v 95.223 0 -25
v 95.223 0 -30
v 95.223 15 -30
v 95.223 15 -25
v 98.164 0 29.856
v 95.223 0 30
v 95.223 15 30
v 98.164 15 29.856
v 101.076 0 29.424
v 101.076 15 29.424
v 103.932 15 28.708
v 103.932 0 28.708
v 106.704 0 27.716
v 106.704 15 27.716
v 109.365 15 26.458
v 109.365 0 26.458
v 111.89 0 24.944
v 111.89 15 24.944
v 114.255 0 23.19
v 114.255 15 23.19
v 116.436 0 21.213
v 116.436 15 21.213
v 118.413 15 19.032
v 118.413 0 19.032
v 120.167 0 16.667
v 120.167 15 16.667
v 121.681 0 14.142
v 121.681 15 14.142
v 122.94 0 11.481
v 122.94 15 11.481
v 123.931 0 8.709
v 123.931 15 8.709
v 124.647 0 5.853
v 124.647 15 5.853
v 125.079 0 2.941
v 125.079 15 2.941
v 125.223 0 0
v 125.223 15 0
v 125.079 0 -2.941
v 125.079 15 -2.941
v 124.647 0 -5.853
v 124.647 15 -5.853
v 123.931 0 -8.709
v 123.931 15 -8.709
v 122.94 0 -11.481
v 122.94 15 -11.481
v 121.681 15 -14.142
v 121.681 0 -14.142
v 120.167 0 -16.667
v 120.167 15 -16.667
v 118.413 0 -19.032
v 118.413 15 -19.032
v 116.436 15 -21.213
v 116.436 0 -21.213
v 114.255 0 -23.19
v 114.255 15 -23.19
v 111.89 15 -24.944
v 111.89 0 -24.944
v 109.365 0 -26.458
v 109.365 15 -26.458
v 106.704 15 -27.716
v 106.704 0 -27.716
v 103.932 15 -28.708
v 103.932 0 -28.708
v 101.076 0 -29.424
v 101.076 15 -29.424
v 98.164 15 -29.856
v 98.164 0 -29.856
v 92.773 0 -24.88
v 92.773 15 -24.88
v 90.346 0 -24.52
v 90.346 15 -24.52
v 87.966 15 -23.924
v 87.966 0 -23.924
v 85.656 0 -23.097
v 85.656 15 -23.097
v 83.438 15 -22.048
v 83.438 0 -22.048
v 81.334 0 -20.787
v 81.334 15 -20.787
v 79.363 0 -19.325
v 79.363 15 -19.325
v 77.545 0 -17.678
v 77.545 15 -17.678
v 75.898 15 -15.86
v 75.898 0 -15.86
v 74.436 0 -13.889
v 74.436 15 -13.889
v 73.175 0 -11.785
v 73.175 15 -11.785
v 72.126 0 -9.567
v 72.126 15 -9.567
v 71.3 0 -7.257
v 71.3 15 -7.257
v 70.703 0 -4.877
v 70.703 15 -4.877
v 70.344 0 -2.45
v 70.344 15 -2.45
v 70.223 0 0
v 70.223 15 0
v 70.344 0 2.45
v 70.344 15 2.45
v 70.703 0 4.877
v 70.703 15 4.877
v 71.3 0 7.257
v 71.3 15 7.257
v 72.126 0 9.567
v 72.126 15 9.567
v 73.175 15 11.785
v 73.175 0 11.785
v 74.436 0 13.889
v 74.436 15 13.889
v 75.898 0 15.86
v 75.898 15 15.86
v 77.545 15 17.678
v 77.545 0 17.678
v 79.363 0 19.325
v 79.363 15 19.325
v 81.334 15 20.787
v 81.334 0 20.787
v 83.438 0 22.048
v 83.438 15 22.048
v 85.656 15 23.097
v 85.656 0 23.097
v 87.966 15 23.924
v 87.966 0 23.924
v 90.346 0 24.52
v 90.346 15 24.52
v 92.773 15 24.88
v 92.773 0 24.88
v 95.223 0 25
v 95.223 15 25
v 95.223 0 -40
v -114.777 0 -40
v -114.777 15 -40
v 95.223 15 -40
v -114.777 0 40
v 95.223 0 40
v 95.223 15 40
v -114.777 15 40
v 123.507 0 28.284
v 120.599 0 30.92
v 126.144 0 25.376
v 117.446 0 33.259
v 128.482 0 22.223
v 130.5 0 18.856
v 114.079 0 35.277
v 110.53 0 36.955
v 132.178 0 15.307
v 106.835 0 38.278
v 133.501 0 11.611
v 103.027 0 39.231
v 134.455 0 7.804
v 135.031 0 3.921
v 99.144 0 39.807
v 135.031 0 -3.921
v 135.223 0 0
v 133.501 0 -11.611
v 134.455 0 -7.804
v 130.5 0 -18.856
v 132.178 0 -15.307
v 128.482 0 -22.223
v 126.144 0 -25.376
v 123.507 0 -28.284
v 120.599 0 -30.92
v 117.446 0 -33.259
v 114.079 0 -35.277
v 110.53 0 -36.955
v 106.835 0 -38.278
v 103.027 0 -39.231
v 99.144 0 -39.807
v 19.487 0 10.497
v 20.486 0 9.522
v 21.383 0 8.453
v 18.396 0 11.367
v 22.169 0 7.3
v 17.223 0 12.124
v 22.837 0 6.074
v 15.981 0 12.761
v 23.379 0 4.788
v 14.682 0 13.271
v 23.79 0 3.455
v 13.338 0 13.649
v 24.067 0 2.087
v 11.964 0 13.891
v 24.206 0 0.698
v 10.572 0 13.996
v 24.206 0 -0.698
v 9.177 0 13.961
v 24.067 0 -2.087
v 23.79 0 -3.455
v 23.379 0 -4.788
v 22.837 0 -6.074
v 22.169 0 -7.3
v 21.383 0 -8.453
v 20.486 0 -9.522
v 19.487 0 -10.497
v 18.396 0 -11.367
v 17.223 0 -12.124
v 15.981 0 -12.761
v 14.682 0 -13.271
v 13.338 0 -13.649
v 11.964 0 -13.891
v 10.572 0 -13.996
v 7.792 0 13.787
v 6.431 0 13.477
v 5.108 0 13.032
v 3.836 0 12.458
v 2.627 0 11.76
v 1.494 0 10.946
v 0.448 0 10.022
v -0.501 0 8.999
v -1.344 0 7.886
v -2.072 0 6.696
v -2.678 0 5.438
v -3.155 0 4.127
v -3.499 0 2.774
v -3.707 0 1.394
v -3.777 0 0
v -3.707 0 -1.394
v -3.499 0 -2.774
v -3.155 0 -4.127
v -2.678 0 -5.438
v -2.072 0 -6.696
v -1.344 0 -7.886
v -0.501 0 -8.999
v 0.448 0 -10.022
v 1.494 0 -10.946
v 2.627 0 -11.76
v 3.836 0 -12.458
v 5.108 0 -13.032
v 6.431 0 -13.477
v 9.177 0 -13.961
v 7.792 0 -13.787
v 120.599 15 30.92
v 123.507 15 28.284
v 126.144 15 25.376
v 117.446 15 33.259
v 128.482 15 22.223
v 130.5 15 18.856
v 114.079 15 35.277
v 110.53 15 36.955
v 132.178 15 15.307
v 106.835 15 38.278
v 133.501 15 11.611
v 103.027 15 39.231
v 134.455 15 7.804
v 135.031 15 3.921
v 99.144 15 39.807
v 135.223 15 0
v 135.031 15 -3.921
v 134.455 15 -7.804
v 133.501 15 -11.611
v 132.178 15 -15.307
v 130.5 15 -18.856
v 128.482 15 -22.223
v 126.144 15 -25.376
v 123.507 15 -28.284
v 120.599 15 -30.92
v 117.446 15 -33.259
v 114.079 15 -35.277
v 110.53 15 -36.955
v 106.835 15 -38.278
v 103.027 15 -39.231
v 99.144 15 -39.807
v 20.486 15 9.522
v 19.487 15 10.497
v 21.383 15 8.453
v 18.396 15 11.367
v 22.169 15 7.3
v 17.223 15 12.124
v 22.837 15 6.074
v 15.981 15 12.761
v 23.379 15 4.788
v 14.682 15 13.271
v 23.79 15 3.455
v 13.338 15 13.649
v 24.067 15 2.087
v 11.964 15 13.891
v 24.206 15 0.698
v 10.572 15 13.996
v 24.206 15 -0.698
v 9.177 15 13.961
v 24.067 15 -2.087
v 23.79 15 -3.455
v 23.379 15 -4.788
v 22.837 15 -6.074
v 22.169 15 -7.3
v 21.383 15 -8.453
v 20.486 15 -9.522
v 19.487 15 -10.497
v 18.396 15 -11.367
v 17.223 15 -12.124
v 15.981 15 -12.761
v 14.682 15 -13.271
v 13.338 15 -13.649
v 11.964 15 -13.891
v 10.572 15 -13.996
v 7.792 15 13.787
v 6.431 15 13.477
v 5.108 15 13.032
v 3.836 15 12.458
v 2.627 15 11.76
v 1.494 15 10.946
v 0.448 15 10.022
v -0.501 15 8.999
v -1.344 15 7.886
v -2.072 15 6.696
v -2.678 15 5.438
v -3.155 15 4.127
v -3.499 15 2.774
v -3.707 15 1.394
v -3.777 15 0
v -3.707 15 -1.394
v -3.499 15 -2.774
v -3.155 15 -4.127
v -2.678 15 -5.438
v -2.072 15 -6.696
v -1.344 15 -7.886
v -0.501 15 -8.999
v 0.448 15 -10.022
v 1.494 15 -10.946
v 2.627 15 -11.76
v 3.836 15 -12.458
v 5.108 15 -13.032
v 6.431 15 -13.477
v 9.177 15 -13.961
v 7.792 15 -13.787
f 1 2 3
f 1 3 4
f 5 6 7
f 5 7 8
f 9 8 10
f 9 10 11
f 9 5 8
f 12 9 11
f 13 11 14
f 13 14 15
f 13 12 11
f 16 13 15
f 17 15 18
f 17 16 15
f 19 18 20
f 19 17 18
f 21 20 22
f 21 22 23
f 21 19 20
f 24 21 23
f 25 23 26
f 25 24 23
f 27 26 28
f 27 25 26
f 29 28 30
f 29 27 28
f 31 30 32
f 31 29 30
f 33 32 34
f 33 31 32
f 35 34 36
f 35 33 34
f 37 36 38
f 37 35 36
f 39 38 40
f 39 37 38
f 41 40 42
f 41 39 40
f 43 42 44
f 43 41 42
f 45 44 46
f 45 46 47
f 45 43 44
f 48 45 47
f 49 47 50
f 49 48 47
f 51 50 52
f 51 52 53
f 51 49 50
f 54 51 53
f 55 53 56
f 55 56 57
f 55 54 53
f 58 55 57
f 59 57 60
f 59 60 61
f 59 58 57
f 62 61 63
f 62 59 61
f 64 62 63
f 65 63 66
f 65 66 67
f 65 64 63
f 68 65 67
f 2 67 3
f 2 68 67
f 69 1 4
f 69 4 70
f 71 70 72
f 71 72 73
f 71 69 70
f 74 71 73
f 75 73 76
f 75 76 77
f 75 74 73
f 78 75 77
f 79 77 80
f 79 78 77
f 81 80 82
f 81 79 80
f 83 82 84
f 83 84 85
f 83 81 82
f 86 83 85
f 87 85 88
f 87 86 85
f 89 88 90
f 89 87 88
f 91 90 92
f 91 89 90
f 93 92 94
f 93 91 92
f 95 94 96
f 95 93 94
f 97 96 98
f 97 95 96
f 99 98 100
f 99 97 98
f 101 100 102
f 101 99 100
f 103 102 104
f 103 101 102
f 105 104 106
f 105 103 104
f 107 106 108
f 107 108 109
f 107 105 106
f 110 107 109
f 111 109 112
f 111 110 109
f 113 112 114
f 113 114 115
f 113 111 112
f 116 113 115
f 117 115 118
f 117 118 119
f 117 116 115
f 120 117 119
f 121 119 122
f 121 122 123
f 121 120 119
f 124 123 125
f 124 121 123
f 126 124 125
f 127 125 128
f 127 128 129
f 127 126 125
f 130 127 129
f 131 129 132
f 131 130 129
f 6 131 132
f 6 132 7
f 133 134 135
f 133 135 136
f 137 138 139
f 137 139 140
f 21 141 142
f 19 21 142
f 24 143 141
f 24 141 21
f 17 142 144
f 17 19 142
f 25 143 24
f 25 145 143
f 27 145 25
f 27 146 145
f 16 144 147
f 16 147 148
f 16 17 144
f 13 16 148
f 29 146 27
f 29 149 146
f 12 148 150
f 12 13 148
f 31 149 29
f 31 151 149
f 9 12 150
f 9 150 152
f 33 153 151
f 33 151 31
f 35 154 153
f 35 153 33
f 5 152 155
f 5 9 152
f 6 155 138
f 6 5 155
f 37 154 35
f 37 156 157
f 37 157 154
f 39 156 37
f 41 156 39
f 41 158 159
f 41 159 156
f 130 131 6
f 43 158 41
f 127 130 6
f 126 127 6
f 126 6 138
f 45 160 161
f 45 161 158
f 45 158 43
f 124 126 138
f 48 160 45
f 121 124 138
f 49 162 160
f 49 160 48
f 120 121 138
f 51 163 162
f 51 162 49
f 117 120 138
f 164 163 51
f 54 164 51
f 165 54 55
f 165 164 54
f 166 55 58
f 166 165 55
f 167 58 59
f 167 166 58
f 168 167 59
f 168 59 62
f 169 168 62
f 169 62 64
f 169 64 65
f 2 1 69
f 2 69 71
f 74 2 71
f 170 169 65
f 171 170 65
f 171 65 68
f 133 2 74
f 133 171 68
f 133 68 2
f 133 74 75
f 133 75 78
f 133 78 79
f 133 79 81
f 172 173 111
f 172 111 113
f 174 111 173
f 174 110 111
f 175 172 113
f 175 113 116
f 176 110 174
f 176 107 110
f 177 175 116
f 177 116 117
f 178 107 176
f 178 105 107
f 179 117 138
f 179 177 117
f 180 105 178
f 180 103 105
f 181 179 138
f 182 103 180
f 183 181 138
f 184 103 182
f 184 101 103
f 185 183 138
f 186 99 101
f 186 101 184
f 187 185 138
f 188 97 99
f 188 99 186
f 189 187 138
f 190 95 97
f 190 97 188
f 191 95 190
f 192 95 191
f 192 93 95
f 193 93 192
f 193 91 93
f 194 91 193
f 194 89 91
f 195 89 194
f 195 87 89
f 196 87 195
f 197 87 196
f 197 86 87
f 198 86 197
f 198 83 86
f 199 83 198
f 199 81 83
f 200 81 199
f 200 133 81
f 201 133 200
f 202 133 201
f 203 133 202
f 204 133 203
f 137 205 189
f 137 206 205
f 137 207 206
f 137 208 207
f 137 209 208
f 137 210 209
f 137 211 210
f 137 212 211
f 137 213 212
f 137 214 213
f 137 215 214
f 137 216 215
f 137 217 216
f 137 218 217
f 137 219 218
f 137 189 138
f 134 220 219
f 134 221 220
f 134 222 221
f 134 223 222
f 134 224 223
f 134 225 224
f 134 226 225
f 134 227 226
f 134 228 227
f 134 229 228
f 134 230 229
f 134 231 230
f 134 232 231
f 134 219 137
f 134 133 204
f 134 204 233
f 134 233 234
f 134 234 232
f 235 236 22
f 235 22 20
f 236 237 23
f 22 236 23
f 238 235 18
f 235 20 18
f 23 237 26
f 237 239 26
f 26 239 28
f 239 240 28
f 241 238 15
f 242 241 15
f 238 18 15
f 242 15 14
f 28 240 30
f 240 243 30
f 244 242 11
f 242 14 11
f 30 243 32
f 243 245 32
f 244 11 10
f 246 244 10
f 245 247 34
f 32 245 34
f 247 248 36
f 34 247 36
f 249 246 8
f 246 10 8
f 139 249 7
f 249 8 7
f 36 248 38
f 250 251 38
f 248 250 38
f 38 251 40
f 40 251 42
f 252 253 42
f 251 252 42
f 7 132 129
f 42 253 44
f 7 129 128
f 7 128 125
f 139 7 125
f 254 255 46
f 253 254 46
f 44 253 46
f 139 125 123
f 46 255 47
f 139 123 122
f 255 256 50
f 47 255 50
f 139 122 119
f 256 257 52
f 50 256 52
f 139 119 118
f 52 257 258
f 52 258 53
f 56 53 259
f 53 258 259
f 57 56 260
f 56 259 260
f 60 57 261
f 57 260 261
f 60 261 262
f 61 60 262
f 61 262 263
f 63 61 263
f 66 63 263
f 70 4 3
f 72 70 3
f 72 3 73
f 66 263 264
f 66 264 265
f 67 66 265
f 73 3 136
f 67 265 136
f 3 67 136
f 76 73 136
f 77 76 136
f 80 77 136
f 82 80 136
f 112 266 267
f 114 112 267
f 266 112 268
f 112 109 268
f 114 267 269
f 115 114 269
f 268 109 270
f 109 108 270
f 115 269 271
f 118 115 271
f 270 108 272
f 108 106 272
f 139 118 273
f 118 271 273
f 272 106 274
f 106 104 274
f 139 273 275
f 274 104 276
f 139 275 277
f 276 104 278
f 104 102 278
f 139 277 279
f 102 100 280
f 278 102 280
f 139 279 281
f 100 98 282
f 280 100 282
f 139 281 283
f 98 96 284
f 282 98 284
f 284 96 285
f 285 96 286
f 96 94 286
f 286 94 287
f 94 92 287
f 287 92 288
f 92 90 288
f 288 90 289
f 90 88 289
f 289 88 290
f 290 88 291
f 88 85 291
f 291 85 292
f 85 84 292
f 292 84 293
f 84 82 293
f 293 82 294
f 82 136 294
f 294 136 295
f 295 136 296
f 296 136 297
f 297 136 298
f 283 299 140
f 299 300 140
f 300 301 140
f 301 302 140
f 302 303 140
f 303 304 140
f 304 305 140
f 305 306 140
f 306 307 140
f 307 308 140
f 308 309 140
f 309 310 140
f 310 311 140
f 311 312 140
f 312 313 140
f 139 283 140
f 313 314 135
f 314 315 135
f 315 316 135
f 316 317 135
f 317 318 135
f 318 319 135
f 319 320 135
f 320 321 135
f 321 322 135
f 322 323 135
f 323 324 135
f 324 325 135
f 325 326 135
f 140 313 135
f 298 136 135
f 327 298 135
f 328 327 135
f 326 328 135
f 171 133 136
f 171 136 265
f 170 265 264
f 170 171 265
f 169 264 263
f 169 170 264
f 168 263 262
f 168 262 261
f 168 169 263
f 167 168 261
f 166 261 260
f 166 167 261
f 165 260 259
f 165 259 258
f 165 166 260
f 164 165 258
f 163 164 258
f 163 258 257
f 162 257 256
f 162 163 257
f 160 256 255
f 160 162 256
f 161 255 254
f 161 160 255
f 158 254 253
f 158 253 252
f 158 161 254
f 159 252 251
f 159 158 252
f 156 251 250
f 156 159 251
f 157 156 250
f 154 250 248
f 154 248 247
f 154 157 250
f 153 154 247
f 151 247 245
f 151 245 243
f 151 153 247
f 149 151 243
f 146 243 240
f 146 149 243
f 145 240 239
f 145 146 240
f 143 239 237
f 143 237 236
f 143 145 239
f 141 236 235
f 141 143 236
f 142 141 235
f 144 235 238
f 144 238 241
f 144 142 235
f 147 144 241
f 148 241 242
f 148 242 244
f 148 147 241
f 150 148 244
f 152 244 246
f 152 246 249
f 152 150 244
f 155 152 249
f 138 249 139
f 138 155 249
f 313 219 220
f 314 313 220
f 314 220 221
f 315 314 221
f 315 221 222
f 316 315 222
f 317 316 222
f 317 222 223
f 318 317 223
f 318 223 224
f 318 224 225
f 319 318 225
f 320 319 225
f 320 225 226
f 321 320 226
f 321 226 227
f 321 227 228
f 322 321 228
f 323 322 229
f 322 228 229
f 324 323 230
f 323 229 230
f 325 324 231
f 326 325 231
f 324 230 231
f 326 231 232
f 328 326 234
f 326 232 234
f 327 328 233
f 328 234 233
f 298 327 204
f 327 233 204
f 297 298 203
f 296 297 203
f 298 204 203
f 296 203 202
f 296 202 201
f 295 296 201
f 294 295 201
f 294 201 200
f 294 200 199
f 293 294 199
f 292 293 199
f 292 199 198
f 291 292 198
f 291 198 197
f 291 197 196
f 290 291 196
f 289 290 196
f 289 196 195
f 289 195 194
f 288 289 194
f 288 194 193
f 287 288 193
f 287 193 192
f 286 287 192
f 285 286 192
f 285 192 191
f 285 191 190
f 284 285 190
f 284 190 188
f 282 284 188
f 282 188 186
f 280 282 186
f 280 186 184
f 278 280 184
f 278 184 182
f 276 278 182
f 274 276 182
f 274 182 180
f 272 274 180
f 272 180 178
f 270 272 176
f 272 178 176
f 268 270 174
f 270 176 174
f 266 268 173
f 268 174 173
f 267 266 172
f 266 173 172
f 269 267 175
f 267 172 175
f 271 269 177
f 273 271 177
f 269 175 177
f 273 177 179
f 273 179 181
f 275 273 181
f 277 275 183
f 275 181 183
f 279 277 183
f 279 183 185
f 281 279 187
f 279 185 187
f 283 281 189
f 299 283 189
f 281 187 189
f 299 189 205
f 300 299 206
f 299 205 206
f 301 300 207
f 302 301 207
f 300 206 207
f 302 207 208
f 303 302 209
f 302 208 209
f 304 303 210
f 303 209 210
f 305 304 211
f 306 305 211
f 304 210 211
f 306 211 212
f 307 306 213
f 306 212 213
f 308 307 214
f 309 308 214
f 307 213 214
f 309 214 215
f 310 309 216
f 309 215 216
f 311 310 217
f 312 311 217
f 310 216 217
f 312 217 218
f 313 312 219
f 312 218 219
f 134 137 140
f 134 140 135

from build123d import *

# Parameters (mm, degrees)
BOSS_EXTRUDE1_DEPTH          = 15
TAP_DRILL_FOR_M30X2_0_TAP1_D = 28


with BuildPart() as part:
    # Sketch1 → Boss-Extrude1 (new body)
    with BuildSketch(Plane(origin=(0, 0, 0), x_dir=(1, 0, 0), z_dir=(0, 1, 0))):
        with BuildLine():
            Line((-114.776877535, 40), (95.223122465, 40))
            ThreePointArc((95.223122465, 40), (135.223122465, 0), (95.223122465, -40))
            Line((95.223122465, -40), (-114.776877535, -40))
            Line((-114.776877535, -40), (-114.776877535, 40))
        make_face()
        with BuildLine():
            Line((95.223122465, 30), (95.223122465, 25))
            ThreePointArc((95.223122465, 25), (70.223122465, 0), (95.223122465, -25))
            Line((95.223122465, -25), (95.223122465, -30))
            ThreePointArc((95.223122465, -30), (125.223122465, 0), (95.223122465, 30))
        make_face(mode=Mode.SUBTRACT)
    extrude(amount=BOSS_EXTRUDE1_DEPTH)

    # Tap Drill for M30x2.0 Tap1 (through all)
    with Locations(Plane(origin=(0, 15, 0), x_dir=(1, 0, 0), z_dir=(0, 1, 0))):
        with Locations((10.223122465, 0)):
            Hole(TAP_DRILL_FOR_M30X2_0_TAP1_D / 2)


solid = part.part
